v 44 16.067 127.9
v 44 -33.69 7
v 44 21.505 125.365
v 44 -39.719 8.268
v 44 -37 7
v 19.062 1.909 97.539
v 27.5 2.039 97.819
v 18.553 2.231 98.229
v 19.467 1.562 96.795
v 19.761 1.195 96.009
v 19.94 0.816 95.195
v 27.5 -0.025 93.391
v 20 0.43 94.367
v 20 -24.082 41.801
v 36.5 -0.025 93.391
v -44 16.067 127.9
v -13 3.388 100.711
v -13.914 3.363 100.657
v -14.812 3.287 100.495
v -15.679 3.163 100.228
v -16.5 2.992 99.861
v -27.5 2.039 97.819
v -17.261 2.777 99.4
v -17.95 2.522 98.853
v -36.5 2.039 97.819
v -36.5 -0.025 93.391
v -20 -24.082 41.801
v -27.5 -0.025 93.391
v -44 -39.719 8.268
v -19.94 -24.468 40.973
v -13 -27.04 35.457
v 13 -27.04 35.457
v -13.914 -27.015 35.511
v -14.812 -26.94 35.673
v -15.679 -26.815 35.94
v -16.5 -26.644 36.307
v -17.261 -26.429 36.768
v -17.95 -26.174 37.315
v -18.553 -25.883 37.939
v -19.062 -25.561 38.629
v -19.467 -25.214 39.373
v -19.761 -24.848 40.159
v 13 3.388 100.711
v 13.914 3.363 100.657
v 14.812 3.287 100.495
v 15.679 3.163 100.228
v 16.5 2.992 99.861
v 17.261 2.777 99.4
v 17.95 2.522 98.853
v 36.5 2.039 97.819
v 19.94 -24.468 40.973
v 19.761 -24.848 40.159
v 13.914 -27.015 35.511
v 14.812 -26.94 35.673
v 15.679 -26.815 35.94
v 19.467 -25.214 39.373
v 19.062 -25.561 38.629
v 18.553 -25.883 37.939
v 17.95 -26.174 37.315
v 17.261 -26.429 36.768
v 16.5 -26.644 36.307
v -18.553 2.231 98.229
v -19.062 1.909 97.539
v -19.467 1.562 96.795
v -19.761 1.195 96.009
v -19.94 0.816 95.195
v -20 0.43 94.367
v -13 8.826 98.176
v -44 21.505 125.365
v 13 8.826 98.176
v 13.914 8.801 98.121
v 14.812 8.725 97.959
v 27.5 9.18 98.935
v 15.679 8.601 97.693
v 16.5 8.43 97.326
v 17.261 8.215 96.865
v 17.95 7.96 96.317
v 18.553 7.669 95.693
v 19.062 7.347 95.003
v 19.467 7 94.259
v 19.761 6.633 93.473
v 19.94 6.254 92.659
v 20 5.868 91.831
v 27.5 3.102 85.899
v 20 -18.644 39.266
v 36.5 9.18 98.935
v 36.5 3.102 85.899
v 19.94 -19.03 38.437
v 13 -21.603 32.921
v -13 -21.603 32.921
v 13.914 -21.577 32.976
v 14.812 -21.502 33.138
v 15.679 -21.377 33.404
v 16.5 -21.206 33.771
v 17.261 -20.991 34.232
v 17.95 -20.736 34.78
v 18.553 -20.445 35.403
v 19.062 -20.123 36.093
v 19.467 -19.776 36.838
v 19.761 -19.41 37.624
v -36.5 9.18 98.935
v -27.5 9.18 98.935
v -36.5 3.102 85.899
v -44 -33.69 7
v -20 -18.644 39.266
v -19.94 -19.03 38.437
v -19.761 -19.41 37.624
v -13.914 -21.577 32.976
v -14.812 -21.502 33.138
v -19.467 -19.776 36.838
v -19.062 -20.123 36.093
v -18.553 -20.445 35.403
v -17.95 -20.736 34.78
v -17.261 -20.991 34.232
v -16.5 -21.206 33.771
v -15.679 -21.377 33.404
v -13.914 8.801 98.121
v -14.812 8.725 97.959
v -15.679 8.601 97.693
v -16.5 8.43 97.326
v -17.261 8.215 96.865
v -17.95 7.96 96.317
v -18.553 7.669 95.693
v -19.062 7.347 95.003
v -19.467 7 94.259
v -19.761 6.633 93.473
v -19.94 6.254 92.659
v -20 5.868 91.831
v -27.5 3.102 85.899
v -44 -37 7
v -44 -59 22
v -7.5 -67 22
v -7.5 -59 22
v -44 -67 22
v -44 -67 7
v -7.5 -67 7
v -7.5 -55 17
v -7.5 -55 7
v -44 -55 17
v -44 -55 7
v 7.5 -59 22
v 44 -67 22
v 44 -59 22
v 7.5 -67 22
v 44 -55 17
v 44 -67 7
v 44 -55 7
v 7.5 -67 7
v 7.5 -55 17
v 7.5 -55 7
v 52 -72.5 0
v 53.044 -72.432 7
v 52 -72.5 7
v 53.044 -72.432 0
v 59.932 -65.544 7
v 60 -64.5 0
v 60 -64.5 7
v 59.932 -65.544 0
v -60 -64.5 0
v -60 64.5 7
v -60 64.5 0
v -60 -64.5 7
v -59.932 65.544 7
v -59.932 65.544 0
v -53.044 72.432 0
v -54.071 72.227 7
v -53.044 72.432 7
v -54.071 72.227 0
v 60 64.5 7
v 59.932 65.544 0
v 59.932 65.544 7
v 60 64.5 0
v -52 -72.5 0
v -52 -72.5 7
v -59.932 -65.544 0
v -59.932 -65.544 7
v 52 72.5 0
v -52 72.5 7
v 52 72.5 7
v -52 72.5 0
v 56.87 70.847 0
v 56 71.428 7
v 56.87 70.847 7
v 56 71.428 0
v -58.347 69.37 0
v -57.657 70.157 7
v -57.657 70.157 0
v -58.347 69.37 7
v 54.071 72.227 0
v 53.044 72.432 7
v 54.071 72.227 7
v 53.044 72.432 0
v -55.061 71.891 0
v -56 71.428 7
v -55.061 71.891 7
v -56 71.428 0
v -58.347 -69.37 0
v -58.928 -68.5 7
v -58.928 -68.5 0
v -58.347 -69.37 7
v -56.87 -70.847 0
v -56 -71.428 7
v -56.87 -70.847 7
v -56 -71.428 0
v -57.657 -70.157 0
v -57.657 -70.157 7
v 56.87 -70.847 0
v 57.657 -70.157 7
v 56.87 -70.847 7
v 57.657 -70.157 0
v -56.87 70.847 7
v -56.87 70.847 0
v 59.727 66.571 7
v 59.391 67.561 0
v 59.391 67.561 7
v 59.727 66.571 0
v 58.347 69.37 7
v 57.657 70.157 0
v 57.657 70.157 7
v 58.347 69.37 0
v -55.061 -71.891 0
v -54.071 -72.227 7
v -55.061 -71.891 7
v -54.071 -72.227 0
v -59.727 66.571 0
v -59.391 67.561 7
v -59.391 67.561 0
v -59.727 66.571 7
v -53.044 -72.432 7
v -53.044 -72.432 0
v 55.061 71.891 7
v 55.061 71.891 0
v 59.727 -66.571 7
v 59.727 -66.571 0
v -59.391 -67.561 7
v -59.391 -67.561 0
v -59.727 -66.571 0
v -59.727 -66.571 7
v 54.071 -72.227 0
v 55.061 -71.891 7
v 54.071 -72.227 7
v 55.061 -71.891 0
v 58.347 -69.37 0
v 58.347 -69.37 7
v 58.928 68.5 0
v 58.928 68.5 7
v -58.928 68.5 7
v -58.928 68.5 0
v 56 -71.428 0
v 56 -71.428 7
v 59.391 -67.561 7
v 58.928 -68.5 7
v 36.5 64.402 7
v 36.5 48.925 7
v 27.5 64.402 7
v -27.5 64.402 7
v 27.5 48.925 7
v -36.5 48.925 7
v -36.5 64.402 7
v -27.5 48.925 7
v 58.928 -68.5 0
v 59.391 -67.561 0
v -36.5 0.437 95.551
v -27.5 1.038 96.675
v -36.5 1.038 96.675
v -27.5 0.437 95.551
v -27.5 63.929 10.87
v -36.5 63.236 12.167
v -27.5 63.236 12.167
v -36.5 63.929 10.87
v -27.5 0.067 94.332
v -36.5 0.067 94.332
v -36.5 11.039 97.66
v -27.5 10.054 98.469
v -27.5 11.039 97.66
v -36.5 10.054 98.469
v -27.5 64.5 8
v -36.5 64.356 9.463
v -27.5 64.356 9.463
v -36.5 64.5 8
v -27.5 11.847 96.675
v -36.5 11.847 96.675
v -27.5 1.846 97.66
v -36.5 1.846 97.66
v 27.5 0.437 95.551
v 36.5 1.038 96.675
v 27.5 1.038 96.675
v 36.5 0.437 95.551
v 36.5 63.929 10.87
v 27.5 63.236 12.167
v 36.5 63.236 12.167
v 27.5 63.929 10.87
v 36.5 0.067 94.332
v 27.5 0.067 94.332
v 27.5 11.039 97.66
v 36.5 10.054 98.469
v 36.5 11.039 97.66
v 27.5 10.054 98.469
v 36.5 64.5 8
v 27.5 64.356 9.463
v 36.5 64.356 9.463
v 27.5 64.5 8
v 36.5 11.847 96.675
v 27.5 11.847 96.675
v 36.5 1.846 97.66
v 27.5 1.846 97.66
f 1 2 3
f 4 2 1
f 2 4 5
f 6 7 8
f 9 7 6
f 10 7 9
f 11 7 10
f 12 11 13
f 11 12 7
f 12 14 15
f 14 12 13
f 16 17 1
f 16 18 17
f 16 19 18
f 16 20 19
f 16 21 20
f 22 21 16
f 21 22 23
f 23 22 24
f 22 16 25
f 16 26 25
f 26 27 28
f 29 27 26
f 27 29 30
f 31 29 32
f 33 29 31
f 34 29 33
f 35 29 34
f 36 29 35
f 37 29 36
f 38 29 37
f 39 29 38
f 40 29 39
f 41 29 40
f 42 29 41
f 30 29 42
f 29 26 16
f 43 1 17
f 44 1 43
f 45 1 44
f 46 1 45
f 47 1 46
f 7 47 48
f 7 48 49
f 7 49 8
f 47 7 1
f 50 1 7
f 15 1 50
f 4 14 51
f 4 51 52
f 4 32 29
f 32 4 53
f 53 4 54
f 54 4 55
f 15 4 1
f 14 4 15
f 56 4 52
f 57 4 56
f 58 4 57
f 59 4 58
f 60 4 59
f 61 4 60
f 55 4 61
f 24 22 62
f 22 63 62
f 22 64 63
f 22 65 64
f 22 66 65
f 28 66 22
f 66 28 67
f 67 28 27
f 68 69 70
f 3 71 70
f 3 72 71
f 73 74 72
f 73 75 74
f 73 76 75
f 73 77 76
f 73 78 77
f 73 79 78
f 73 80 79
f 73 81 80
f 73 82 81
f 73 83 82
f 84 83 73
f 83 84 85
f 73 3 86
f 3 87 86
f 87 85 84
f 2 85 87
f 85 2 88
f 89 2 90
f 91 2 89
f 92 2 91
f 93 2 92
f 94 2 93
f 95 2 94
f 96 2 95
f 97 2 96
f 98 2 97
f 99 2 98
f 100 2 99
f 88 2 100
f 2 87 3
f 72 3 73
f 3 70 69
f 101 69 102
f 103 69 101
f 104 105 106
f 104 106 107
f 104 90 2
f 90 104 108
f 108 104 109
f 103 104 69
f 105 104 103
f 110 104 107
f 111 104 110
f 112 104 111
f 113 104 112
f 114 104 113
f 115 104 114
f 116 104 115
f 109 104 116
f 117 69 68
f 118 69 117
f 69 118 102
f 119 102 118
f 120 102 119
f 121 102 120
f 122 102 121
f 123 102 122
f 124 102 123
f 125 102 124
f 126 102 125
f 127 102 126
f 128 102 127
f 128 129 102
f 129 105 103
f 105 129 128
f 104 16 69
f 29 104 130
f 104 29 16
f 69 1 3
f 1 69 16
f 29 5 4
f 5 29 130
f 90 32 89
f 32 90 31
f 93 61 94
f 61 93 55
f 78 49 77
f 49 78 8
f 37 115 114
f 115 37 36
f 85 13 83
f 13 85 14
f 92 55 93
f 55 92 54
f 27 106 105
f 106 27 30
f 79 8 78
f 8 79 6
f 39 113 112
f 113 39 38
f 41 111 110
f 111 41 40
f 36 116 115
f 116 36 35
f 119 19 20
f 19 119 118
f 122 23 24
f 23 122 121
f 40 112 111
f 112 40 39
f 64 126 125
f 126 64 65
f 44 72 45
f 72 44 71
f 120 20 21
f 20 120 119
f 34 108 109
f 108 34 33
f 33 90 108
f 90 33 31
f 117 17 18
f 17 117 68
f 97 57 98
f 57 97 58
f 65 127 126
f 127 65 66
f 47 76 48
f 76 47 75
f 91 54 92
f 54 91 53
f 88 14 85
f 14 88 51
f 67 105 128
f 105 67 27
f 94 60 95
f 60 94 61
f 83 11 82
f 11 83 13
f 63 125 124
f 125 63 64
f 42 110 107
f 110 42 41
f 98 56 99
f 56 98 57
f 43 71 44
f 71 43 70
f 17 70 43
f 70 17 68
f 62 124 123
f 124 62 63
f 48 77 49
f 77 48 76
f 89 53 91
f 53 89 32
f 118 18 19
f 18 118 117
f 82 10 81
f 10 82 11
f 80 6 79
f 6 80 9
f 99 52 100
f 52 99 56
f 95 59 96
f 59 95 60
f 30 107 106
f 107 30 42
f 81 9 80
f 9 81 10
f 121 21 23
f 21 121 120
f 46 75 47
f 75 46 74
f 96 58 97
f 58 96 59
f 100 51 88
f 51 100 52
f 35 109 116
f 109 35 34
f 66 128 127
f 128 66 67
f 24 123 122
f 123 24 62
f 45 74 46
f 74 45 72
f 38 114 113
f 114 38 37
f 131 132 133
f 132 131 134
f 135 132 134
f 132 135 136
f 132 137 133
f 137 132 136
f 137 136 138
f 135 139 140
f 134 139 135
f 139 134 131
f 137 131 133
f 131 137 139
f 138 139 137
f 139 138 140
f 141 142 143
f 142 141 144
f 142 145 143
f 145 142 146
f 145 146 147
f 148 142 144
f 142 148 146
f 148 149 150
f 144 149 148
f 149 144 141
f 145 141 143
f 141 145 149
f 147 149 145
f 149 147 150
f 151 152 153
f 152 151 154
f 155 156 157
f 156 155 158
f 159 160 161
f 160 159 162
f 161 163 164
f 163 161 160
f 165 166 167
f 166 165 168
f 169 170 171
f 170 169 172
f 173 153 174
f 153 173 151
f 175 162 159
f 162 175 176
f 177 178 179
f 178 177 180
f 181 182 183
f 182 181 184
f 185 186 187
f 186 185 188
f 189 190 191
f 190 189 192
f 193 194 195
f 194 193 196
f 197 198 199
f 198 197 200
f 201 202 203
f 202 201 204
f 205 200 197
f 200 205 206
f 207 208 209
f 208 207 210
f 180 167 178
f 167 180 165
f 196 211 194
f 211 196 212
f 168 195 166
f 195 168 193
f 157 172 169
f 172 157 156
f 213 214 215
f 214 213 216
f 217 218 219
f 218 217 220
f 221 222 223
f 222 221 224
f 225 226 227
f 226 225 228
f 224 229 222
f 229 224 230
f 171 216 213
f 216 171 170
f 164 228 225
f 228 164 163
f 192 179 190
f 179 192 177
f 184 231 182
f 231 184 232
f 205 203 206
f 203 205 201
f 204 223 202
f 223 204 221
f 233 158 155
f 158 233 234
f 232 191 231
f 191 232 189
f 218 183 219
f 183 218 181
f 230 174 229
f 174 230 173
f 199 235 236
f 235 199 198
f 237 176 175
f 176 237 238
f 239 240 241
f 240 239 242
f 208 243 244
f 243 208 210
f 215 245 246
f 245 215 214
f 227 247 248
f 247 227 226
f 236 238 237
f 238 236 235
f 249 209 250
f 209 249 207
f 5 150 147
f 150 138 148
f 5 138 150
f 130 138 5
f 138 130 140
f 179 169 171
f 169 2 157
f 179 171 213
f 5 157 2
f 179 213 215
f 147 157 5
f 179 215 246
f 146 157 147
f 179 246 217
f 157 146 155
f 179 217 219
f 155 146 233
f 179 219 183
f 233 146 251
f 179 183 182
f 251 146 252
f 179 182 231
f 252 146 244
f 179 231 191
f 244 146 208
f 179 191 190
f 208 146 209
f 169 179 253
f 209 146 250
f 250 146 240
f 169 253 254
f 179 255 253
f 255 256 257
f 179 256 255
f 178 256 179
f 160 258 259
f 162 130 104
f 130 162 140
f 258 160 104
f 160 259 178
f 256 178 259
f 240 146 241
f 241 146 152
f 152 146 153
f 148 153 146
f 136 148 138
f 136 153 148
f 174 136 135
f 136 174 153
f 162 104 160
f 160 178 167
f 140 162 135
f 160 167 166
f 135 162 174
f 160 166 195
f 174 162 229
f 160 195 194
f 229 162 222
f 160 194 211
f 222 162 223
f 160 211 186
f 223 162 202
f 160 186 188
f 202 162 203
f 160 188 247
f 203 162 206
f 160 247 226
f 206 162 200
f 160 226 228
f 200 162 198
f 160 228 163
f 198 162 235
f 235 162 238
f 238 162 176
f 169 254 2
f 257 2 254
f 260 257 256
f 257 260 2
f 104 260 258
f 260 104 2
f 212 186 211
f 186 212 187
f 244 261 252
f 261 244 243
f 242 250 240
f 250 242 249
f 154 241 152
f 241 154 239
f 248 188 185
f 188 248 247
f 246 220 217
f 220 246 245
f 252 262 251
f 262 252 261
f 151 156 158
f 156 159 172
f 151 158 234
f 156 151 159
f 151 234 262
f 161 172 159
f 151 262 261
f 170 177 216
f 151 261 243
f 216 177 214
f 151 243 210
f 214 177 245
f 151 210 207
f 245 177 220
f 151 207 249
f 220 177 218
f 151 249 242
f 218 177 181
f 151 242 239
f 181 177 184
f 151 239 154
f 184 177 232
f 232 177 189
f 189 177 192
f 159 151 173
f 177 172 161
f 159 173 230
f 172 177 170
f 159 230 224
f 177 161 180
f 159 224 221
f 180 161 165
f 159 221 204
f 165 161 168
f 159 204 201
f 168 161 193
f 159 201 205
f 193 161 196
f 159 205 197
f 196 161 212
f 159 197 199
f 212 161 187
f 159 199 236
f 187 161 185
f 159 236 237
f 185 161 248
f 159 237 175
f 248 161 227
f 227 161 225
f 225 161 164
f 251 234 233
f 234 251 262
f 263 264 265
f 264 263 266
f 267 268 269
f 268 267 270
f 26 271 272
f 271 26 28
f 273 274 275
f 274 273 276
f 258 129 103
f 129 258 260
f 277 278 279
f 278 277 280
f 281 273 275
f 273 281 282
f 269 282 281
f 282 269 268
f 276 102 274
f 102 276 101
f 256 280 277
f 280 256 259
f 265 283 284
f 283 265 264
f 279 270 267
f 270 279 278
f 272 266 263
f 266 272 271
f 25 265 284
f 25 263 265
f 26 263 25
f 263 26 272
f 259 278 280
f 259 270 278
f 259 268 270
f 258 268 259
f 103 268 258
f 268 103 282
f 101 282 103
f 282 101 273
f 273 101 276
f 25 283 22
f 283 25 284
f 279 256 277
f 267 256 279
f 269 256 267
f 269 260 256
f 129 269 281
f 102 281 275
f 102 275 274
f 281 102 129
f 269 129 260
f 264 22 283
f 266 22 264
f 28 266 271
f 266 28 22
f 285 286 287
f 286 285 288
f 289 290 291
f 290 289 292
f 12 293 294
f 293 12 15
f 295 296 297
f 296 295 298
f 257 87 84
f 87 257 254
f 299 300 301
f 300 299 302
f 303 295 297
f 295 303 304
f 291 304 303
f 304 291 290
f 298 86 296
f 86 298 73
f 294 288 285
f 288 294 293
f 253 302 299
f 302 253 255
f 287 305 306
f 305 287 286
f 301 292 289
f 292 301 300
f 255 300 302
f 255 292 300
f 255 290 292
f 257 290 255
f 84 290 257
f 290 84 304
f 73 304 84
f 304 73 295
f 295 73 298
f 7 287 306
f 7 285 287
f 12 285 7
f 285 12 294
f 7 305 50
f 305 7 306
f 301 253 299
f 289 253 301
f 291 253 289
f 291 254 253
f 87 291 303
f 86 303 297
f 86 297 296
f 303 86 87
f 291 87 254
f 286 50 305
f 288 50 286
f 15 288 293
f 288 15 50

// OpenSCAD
/*
PARAMETRIC PHONE STAND — XR/AI Hackathon Demo
Units: millimetres. One-piece stand; designed for FDM printing.

KEY AI-EDITABLE PARAMETERS:
- viewing_angle       : angle of the phone support above the desk (degrees)
- backrest_length     : length of the tilted phone support (mm)
- backrest_width      : width of the support frame (mm)
- base_width          : overall left–right footprint (mm)
- base_depth          : overall front–back footprint (mm)
- lip_height          : front retaining lip height above the base (mm)
- charging_notch_width: center opening for a charging cable (mm)

Demo variants: set viewing_angle=50, 65 or 80 degrees.
All 3 variants maintain the same phone-rest geometry except the viewing angle.
Tip: F5 = preview; F6 = full render; File > Export > STL.
*/

// ---------- Editable design parameters ----------
viewing_angle        = 65;     // degrees from horizontal; suggested range 50..80
backrest_length      = 132;    // mm along inclined support
backrest_width       = 88;     // mm (left to right)
backrest_thickness   = 6;      // mm
window_width         = 40;     // mm, center cutout width
window_length        = 72;     // mm, center cutout length
window_corner_radius = 7;      // mm

base_width           = 120;    // mm
base_depth           = 145;    // mm
base_thickness       = 7;      // mm
base_corner_radius   = 8;      // mm

backrest_bottom_y    = -37;    // mm, pivot location on base
lip_width            = 88;     // mm
lip_front_y          = -67;    // mm
lip_thickness        = 12;     // mm (front to back)
lip_height           = 15;     // mm above the base
charging_notch_width = 15;     // mm; set to 0 for a continuous lip

rib_thickness        = 9;      // mm, two triangular support ribs
rib_center_offset    = 32;     // mm from center left/right
rib_rear_y           = 57;     // mm
rib_attach_fraction  = 0.73;   // along the inclined backrest (0..1)
rib_beam_radius       = 6.5;    // mm, radius of diagonal support struts

$fn = 48;

assert(viewing_angle >= 45 && viewing_angle <= 85, "Angle outside tested design range");
assert(backrest_width <= base_width, "Backrest wider than base");
assert(window_width < backrest_width - 2 * rib_thickness, "Window too wide for backrest rails");
assert(window_length < backrest_length - 24, "Window too long");
assert(lip_width > charging_notch_width, "Notch must be narrower than lip");
assert(base_corner_radius * 2 < min(base_width, base_depth), "Base corner radius too large");

// An extruded polygon drawn as (y,z), with thickness in x.
module yz_extrusion(points, xcenter, thickness) {
    translate([xcenter - thickness/2, 0, 0])
        rotate([0,90,0])
            linear_extrude(height=thickness, convexity=10)
                polygon(points=[for (p=points) [-p[1], p[0]]]);
}

// Rounded footprint, lies flat on the print bed.
module footprint() {
    linear_extrude(height=base_thickness, convexity=10)
        offset(r=base_corner_radius)
            square([base_width-2*base_corner_radius,
                    base_depth-2*base_corner_radius], center=true);
}

// Tilted back support; a central window reduces material and shows angle clearly.
module backrest() {
    translate([0, backrest_bottom_y, base_thickness])
        rotate([viewing_angle,0,0])
            translate([0,backrest_length/2,0])
                difference() {
                    cube([backrest_width,backrest_length,backrest_thickness], center=true);
                    // Opening passes completely through the backrest thickness.
                    translate([0,0,-backrest_thickness])
                        linear_extrude(height=2*backrest_thickness, convexity=10)
                            offset(r=window_corner_radius)
                                square([window_width-2*window_corner_radius,
                                        window_length-2*window_corner_radius], center=true);
                }
}

// Two diagonal support struts stabilize the tilted frame without a solid wall.
module support_rib(xcenter) {
    a = viewing_angle;
    t = rib_attach_fraction * backrest_length;
    // Attach to rear face of the backrest.
    ya = backrest_bottom_y + t*cos(a) + (backrest_thickness/2)*sin(a);
    za = base_thickness + t*sin(a) - (backrest_thickness/2)*cos(a);
    translate([xcenter-rib_thickness/2,0,0])
        rotate([0,90,0])
            linear_extrude(height=rib_thickness, convexity=10)
                hull() {
                    translate([-za, ya]) circle(r=rib_beam_radius, $fn=32);
                    translate([-(base_thickness+1),rib_rear_y]) circle(r=rib_beam_radius+1, $fn=32);
                }
}

// Front stop with a cable-access notch in the middle.
module retaining_lip() {
    segment_width = (lip_width-charging_notch_width)/2;
    profile = [
        [lip_front_y,base_thickness-1],
        [lip_front_y+lip_thickness,base_thickness-1],
        [lip_front_y+lip_thickness,base_thickness+lip_height-5],
        [lip_front_y+lip_thickness-4,base_thickness+lip_height],
        [lip_front_y,base_thickness+lip_height]
    ];
    if (charging_notch_width == 0)
        yz_extrusion(profile,0,lip_width);
    else {
        yz_extrusion(profile,-(charging_notch_width+segment_width)/2,segment_width);
        yz_extrusion(profile, (charging_notch_width+segment_width)/2,segment_width);
    }
}

// This is the printed part (phone itself is intentionally not included).
union() {
    footprint();
    backrest();
    support_rib(-rib_center_offset);
    support_rib( rib_center_offset);
    retaining_lip();
}
